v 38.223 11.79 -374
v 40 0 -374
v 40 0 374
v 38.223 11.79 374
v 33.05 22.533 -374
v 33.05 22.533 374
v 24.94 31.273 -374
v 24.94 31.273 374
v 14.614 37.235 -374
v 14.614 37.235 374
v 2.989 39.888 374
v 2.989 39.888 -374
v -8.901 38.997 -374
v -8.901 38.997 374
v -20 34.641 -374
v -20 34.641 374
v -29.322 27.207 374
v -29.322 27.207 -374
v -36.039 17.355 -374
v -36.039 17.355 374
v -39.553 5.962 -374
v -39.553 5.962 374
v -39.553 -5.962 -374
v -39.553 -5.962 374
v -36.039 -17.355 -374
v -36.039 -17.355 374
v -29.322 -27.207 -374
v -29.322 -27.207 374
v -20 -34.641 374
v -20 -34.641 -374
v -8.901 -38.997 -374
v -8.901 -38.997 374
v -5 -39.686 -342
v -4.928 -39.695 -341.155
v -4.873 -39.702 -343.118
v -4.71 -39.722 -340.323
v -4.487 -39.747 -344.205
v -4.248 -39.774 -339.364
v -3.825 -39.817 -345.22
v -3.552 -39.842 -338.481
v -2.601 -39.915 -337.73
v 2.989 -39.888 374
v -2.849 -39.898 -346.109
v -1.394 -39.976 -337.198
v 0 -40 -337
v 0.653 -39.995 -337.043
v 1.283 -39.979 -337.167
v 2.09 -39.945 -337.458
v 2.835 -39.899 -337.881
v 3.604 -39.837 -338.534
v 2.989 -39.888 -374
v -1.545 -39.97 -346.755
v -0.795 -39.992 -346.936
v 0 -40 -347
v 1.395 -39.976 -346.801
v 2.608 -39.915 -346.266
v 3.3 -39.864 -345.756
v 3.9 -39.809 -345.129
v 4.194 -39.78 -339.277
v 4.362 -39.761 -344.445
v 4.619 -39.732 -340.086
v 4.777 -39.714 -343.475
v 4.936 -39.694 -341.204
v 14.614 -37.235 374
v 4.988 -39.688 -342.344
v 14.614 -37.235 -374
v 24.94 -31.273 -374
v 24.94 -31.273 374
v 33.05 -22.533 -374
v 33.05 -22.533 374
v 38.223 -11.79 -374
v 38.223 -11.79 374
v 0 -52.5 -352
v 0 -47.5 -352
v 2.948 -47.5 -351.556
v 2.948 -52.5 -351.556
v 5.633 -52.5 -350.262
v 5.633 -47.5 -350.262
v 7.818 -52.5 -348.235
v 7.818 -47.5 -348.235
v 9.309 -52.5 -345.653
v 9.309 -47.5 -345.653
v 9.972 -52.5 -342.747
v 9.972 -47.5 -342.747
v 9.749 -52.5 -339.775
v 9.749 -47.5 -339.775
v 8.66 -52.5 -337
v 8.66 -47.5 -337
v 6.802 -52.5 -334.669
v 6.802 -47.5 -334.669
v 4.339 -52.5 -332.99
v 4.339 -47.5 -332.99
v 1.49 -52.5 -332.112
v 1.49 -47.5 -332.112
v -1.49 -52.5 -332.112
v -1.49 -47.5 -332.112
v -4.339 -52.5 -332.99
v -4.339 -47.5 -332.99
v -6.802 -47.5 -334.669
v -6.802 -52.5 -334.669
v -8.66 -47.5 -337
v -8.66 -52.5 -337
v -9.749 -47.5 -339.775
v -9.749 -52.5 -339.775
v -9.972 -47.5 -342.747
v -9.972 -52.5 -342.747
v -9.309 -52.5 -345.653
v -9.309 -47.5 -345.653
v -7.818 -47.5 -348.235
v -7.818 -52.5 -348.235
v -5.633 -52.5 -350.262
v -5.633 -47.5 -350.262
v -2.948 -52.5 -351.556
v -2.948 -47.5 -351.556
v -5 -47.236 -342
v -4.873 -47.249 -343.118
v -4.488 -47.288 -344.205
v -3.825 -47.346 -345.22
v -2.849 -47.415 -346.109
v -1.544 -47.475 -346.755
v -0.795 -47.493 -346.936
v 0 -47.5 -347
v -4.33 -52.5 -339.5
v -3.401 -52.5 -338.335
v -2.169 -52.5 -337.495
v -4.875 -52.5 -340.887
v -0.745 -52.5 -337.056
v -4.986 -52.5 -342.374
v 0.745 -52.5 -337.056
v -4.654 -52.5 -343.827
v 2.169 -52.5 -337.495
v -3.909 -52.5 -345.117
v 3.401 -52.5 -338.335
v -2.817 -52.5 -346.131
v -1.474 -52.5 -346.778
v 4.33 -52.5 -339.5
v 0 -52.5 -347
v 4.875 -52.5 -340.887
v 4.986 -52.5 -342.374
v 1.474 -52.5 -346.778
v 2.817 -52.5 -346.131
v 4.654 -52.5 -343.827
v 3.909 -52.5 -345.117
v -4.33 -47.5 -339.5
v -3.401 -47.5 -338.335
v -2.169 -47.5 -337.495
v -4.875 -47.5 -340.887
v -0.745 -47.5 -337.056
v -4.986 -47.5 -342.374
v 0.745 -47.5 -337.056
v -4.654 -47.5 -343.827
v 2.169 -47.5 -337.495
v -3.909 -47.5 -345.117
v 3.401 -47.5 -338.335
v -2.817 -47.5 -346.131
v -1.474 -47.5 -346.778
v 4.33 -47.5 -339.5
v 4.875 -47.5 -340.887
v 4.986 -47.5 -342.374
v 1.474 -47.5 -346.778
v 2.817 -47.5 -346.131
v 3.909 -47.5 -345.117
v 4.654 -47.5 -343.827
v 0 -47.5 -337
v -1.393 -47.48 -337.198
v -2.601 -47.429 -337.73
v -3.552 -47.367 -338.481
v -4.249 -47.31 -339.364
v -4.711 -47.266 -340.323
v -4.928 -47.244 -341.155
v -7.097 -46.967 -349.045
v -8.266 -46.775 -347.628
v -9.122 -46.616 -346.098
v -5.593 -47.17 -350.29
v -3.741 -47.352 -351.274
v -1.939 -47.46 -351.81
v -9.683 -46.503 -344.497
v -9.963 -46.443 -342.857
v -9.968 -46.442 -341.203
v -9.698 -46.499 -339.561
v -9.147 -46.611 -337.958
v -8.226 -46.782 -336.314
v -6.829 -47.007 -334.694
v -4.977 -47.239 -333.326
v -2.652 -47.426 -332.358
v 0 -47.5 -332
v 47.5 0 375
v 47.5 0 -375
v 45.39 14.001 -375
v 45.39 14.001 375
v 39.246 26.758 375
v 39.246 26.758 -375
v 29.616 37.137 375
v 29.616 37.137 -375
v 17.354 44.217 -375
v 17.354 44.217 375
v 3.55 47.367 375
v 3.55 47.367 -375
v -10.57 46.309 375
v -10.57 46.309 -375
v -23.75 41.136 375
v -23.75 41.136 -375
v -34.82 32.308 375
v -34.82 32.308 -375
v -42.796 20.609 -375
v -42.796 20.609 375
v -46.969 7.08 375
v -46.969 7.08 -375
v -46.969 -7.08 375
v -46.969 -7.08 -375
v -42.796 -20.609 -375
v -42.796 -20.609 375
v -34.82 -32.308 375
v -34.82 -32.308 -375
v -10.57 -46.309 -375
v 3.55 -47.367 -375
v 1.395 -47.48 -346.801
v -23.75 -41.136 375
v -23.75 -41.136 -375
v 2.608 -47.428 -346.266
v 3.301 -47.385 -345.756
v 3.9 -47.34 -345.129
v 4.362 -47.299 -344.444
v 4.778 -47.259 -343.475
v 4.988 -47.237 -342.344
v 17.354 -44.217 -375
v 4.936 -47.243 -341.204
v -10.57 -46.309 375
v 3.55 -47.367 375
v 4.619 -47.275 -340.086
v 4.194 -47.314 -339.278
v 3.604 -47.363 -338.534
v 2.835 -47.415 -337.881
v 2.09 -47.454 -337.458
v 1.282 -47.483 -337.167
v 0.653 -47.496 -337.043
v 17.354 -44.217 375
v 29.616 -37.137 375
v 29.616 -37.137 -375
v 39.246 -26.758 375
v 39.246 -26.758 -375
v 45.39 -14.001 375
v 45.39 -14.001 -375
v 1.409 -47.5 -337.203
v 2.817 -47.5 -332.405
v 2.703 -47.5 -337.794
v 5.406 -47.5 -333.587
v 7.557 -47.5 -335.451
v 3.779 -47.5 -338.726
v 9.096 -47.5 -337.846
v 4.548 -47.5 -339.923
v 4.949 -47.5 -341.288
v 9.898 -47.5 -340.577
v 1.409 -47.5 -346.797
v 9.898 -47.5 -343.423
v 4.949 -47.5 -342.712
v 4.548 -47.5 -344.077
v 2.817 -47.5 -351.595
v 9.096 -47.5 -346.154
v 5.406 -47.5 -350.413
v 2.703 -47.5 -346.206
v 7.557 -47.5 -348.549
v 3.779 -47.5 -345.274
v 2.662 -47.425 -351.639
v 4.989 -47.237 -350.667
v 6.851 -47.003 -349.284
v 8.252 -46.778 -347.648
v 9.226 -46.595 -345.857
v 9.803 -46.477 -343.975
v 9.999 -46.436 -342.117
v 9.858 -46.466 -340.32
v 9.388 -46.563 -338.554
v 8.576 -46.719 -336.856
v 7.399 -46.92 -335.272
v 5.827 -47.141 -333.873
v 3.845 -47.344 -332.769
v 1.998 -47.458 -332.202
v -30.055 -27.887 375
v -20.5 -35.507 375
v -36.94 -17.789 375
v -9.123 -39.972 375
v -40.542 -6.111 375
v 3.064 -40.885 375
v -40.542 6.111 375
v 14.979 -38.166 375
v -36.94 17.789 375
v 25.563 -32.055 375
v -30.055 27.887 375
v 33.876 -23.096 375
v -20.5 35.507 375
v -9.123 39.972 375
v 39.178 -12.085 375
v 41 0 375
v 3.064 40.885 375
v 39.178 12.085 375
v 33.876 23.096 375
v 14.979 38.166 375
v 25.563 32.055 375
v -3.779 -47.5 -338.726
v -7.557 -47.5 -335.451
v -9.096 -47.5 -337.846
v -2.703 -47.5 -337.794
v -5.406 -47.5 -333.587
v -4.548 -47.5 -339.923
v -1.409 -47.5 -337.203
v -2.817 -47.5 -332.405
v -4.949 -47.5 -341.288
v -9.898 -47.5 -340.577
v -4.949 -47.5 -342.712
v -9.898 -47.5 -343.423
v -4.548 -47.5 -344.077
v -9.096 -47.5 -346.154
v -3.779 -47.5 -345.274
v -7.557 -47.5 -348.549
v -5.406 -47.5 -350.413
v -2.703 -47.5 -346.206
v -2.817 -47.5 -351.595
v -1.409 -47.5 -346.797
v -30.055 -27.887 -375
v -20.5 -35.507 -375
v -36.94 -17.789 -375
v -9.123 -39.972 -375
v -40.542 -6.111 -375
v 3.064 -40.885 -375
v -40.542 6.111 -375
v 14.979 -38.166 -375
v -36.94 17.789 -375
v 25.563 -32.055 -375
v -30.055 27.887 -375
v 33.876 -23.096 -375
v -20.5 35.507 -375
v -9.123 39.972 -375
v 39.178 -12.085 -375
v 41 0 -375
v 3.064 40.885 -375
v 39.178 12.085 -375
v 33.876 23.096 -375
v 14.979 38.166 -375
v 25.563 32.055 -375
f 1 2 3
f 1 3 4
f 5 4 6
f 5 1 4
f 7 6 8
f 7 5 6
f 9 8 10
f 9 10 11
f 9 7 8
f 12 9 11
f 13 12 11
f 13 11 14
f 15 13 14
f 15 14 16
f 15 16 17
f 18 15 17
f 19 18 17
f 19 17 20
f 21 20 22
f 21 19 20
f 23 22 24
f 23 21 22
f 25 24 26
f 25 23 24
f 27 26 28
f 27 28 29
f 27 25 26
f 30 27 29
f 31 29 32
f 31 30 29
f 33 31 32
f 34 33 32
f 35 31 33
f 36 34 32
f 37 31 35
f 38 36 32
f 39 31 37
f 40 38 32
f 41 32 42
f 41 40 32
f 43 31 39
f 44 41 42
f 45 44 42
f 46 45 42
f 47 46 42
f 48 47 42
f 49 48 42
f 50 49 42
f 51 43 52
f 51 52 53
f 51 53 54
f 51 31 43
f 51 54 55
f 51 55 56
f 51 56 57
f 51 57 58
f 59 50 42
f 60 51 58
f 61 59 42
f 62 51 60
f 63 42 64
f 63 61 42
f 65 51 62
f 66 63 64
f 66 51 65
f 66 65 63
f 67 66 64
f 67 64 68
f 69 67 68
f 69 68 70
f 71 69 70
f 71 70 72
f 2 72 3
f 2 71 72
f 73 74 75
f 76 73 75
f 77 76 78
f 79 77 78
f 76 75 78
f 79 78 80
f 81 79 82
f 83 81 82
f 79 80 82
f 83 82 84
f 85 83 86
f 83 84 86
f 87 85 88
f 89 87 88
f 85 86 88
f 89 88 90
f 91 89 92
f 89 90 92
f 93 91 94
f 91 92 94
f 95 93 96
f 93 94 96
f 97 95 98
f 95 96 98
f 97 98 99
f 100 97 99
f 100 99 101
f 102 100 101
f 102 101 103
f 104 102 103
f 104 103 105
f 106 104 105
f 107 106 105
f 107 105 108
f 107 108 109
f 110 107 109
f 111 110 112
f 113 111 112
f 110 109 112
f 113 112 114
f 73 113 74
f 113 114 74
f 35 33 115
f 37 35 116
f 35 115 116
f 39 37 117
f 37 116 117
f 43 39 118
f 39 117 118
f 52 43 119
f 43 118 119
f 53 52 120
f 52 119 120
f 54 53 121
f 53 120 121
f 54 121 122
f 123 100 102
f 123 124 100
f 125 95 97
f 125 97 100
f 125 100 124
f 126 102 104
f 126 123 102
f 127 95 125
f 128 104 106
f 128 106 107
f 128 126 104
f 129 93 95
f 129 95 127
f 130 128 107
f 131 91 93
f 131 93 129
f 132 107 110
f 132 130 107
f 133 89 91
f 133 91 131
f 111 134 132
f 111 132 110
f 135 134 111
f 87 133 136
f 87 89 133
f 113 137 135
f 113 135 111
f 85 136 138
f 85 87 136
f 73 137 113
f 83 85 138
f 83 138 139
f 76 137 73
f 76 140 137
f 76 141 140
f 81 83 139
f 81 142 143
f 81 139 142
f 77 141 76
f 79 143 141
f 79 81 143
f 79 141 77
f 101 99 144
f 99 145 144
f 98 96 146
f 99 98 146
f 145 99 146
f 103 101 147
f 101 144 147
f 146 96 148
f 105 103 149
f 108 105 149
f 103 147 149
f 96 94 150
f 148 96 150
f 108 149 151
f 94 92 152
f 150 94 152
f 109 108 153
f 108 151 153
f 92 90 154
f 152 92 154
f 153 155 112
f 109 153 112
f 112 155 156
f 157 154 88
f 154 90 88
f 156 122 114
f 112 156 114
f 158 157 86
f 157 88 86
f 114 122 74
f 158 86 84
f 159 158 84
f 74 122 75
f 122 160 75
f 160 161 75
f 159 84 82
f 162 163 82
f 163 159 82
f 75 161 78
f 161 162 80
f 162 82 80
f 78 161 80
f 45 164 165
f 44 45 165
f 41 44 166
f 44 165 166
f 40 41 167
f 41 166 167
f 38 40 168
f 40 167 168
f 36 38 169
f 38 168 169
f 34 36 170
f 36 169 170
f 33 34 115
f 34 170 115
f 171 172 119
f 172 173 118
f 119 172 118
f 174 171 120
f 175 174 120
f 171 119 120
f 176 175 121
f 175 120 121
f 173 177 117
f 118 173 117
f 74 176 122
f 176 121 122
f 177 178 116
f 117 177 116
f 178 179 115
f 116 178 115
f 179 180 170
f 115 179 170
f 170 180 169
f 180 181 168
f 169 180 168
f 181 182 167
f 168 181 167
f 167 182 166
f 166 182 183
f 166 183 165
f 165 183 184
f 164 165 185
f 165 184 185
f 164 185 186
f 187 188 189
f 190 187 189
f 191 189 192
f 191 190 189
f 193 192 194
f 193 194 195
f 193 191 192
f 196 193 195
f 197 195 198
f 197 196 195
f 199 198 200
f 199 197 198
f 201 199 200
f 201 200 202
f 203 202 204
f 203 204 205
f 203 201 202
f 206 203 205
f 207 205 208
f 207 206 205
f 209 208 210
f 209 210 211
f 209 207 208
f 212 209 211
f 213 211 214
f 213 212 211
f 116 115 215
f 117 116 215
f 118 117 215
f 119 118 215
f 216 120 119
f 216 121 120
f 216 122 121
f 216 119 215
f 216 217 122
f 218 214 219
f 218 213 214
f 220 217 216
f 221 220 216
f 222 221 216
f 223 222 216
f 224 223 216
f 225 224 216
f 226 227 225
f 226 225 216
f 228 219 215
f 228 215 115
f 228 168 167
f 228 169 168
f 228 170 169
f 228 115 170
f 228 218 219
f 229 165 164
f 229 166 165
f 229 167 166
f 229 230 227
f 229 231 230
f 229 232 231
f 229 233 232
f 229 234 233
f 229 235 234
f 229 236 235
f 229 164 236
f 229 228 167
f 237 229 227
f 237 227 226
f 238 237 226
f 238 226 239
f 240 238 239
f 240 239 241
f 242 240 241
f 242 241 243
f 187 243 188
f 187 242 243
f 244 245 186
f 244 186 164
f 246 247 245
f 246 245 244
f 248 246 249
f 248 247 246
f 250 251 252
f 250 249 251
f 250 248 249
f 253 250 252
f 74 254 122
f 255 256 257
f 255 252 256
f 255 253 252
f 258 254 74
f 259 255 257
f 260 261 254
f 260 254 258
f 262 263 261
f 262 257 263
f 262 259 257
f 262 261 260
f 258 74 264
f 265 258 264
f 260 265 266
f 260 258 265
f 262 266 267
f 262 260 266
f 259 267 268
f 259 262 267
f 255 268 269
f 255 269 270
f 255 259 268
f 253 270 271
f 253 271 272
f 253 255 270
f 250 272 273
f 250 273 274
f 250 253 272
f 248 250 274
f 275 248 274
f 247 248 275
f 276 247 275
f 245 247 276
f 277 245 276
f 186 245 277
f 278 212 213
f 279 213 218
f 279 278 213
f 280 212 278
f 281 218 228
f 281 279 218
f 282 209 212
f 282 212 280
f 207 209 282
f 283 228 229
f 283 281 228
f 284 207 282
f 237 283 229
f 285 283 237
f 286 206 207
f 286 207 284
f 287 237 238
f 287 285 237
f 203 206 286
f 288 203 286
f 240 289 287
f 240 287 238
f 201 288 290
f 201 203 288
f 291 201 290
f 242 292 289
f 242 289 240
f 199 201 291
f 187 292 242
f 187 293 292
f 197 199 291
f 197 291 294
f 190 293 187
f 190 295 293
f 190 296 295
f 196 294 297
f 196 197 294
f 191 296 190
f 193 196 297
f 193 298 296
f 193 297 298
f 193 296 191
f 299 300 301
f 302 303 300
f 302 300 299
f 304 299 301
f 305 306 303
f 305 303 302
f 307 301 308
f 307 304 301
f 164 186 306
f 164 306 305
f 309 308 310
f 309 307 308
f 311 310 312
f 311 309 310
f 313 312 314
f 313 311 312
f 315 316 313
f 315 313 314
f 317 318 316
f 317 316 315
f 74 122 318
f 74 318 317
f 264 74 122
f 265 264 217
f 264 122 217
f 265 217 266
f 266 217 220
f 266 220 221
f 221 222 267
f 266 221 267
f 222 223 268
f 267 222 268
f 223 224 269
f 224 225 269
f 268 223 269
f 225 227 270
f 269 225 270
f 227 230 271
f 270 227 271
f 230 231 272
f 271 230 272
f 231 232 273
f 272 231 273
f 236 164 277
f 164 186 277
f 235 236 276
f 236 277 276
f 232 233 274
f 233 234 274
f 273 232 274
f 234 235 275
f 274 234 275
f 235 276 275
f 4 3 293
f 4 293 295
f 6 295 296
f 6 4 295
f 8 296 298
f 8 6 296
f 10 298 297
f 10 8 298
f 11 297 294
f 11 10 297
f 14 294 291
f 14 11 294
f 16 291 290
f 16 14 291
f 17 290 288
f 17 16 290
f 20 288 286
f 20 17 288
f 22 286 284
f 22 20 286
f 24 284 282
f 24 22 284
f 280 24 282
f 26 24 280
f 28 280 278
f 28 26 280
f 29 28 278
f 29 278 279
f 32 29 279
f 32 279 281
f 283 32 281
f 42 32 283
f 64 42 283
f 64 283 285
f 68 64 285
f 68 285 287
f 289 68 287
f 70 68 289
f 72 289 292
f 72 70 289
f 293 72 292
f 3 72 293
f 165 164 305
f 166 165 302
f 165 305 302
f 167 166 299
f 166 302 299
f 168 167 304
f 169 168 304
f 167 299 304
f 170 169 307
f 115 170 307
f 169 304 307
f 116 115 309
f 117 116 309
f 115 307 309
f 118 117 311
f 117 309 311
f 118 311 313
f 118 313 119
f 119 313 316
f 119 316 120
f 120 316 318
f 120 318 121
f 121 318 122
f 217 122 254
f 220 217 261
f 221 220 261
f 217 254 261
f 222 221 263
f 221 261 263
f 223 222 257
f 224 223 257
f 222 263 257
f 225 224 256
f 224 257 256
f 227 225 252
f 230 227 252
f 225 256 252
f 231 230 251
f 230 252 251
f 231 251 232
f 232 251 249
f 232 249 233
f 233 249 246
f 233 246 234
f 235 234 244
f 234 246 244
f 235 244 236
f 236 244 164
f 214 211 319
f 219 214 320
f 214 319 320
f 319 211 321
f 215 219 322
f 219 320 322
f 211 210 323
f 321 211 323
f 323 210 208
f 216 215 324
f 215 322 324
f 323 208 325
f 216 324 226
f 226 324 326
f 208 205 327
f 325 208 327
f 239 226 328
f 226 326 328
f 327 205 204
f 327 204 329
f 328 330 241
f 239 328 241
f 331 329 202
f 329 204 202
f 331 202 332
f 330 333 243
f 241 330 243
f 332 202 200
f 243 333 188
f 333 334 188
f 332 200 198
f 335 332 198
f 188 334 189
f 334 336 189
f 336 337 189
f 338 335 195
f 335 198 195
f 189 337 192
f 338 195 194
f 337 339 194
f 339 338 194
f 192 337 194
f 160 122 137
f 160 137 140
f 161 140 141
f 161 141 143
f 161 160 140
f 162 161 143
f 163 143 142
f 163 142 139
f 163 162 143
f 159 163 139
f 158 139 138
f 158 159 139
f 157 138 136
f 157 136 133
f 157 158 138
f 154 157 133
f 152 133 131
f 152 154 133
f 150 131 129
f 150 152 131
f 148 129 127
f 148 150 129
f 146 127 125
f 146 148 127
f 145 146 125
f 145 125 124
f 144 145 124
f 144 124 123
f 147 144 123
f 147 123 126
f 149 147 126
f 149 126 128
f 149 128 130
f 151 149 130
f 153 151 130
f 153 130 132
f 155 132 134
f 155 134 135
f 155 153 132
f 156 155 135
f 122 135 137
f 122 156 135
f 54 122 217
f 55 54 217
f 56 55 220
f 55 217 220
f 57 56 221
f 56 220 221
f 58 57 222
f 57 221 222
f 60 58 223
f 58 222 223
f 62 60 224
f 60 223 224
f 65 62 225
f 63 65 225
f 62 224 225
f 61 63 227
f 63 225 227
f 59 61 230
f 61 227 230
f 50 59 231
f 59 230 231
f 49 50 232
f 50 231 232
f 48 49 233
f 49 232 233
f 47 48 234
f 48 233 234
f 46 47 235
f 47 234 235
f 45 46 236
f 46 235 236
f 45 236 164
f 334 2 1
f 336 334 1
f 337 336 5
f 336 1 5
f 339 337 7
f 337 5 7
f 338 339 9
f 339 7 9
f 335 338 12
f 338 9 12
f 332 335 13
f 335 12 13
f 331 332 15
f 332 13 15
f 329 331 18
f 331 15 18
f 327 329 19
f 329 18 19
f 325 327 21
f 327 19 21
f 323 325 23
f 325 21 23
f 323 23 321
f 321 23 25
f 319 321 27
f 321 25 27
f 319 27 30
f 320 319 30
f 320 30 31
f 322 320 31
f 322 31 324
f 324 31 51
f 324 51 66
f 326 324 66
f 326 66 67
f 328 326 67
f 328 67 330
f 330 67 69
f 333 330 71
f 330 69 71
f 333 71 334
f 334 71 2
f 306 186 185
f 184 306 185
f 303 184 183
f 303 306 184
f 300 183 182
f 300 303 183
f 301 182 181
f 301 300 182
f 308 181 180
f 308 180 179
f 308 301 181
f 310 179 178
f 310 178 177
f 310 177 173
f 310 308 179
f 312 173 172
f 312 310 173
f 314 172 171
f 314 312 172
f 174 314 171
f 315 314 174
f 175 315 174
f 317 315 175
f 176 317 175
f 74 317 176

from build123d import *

# Parameters (mm, degrees)
SKETCH1_R           = 47.5
SKETCH1_R_2         = 40
BOSS_EXTRUDE1_DEPTH = 375
CUT_EXTRUDE1_DEPTH  = 20
SKETCH3_R           = 10
SKETCH3_R_2         = 5
BOSS_EXTRUDE2_DEPTH = 5
BOSS_EXTRUDE3_REACH = 391.752
SKETCH4_R           = 10
SKETCH4_R_2         = 5
CHAMFER1_SIZE       = 1


with BuildPart() as part:
    # Sketch1 → Boss-Extrude1 (new, symmetric)
    with BuildSketch(Plane.XY):
        Circle(SKETCH1_R)
        Circle(SKETCH1_R_2, mode=Mode.SUBTRACT)
    extrude(amount=BOSS_EXTRUDE1_DEPTH, both=True)

    # Sketch2 → Cut-Extrude1 (cut)
    with BuildSketch(Plane(origin=(0, -47.5, 0), x_dir=(-1, 0, 0), z_dir=(0, -1, 0))):
        with BuildLine():
            ThreePointArc((5, 342), (3.535533906, 345.535533906), (0, 347))
            Line((0, 347), (0, 342))
            Line((0, 342), (0, 337))
            ThreePointArc((0, 337), (3.535533906, 338.464466094), (5, 342))
        make_face()
        with BuildLine():
            Line((0, 342), (0, 347))
            ThreePointArc((0, 347), (-5, 342), (0, 337))
            Line((0, 337), (0, 342))
        make_face()
    extrude(amount=-CUT_EXTRUDE1_DEPTH, mode=Mode.SUBTRACT)


with BuildPart() as body_2:
    # Sketch3 → Boss-Extrude2 (new body)
    with BuildSketch(Plane(origin=(0, -47.5, 0), x_dir=(-1, 0, 0), z_dir=(0, -1, 0))):
        with Locations(Location((0, 342, 0), (0, 0, 90))):
            Circle(SKETCH3_R)
        with Locations(Location((0, 342, 0), (0, 0, 90))):
            Circle(SKETCH3_R_2, mode=Mode.SUBTRACT)
    extrude(amount=BOSS_EXTRUDE2_DEPTH)


with BuildPart() as body_3:

    # Sketch4 → Boss-Extrude3 (new, up to next)
    with BuildSketch(Plane(origin=(0, -47.5, 0), x_dir=(-1, 0, 0), z_dir=(0, -1, 0)), mode=Mode.PRIVATE) as boss_extrude3_sk1:
        with Locations(Location((0, 342, 0), (0, 0, 90))):
            Circle(SKETCH4_R)
        with Locations(Location((0, 342, 0), (0, 0, 90))):
            Circle(SKETCH4_R_2, mode=Mode.SUBTRACT)
    boss_extrude3_tool1 = extrude(boss_extrude3_sk1.sketch, amount=-BOSS_EXTRUDE3_REACH, mode=Mode.PRIVATE) - part.part
    add(boss_extrude3_tool1.solids().sort_by_distance((0, -47.5, -332.282843))[0])
    add(boss_extrude3_tool1.solids().sort_by_distance((0, -47.5, -332.282843))[1])


with BuildPart() as part_1:
    add(part.part)

    # Chamfer1
    chamfer1_edges = [part_1.edges().sort_by_distance(p)[0] for p in [
        (-40, 0, -375),
        (-40, 0, 375),
    ]]
    chamfer(chamfer1_edges, length=CHAMFER1_SIZE)


solid = Compound([body_2.part, body_3.part, part_1.part])
